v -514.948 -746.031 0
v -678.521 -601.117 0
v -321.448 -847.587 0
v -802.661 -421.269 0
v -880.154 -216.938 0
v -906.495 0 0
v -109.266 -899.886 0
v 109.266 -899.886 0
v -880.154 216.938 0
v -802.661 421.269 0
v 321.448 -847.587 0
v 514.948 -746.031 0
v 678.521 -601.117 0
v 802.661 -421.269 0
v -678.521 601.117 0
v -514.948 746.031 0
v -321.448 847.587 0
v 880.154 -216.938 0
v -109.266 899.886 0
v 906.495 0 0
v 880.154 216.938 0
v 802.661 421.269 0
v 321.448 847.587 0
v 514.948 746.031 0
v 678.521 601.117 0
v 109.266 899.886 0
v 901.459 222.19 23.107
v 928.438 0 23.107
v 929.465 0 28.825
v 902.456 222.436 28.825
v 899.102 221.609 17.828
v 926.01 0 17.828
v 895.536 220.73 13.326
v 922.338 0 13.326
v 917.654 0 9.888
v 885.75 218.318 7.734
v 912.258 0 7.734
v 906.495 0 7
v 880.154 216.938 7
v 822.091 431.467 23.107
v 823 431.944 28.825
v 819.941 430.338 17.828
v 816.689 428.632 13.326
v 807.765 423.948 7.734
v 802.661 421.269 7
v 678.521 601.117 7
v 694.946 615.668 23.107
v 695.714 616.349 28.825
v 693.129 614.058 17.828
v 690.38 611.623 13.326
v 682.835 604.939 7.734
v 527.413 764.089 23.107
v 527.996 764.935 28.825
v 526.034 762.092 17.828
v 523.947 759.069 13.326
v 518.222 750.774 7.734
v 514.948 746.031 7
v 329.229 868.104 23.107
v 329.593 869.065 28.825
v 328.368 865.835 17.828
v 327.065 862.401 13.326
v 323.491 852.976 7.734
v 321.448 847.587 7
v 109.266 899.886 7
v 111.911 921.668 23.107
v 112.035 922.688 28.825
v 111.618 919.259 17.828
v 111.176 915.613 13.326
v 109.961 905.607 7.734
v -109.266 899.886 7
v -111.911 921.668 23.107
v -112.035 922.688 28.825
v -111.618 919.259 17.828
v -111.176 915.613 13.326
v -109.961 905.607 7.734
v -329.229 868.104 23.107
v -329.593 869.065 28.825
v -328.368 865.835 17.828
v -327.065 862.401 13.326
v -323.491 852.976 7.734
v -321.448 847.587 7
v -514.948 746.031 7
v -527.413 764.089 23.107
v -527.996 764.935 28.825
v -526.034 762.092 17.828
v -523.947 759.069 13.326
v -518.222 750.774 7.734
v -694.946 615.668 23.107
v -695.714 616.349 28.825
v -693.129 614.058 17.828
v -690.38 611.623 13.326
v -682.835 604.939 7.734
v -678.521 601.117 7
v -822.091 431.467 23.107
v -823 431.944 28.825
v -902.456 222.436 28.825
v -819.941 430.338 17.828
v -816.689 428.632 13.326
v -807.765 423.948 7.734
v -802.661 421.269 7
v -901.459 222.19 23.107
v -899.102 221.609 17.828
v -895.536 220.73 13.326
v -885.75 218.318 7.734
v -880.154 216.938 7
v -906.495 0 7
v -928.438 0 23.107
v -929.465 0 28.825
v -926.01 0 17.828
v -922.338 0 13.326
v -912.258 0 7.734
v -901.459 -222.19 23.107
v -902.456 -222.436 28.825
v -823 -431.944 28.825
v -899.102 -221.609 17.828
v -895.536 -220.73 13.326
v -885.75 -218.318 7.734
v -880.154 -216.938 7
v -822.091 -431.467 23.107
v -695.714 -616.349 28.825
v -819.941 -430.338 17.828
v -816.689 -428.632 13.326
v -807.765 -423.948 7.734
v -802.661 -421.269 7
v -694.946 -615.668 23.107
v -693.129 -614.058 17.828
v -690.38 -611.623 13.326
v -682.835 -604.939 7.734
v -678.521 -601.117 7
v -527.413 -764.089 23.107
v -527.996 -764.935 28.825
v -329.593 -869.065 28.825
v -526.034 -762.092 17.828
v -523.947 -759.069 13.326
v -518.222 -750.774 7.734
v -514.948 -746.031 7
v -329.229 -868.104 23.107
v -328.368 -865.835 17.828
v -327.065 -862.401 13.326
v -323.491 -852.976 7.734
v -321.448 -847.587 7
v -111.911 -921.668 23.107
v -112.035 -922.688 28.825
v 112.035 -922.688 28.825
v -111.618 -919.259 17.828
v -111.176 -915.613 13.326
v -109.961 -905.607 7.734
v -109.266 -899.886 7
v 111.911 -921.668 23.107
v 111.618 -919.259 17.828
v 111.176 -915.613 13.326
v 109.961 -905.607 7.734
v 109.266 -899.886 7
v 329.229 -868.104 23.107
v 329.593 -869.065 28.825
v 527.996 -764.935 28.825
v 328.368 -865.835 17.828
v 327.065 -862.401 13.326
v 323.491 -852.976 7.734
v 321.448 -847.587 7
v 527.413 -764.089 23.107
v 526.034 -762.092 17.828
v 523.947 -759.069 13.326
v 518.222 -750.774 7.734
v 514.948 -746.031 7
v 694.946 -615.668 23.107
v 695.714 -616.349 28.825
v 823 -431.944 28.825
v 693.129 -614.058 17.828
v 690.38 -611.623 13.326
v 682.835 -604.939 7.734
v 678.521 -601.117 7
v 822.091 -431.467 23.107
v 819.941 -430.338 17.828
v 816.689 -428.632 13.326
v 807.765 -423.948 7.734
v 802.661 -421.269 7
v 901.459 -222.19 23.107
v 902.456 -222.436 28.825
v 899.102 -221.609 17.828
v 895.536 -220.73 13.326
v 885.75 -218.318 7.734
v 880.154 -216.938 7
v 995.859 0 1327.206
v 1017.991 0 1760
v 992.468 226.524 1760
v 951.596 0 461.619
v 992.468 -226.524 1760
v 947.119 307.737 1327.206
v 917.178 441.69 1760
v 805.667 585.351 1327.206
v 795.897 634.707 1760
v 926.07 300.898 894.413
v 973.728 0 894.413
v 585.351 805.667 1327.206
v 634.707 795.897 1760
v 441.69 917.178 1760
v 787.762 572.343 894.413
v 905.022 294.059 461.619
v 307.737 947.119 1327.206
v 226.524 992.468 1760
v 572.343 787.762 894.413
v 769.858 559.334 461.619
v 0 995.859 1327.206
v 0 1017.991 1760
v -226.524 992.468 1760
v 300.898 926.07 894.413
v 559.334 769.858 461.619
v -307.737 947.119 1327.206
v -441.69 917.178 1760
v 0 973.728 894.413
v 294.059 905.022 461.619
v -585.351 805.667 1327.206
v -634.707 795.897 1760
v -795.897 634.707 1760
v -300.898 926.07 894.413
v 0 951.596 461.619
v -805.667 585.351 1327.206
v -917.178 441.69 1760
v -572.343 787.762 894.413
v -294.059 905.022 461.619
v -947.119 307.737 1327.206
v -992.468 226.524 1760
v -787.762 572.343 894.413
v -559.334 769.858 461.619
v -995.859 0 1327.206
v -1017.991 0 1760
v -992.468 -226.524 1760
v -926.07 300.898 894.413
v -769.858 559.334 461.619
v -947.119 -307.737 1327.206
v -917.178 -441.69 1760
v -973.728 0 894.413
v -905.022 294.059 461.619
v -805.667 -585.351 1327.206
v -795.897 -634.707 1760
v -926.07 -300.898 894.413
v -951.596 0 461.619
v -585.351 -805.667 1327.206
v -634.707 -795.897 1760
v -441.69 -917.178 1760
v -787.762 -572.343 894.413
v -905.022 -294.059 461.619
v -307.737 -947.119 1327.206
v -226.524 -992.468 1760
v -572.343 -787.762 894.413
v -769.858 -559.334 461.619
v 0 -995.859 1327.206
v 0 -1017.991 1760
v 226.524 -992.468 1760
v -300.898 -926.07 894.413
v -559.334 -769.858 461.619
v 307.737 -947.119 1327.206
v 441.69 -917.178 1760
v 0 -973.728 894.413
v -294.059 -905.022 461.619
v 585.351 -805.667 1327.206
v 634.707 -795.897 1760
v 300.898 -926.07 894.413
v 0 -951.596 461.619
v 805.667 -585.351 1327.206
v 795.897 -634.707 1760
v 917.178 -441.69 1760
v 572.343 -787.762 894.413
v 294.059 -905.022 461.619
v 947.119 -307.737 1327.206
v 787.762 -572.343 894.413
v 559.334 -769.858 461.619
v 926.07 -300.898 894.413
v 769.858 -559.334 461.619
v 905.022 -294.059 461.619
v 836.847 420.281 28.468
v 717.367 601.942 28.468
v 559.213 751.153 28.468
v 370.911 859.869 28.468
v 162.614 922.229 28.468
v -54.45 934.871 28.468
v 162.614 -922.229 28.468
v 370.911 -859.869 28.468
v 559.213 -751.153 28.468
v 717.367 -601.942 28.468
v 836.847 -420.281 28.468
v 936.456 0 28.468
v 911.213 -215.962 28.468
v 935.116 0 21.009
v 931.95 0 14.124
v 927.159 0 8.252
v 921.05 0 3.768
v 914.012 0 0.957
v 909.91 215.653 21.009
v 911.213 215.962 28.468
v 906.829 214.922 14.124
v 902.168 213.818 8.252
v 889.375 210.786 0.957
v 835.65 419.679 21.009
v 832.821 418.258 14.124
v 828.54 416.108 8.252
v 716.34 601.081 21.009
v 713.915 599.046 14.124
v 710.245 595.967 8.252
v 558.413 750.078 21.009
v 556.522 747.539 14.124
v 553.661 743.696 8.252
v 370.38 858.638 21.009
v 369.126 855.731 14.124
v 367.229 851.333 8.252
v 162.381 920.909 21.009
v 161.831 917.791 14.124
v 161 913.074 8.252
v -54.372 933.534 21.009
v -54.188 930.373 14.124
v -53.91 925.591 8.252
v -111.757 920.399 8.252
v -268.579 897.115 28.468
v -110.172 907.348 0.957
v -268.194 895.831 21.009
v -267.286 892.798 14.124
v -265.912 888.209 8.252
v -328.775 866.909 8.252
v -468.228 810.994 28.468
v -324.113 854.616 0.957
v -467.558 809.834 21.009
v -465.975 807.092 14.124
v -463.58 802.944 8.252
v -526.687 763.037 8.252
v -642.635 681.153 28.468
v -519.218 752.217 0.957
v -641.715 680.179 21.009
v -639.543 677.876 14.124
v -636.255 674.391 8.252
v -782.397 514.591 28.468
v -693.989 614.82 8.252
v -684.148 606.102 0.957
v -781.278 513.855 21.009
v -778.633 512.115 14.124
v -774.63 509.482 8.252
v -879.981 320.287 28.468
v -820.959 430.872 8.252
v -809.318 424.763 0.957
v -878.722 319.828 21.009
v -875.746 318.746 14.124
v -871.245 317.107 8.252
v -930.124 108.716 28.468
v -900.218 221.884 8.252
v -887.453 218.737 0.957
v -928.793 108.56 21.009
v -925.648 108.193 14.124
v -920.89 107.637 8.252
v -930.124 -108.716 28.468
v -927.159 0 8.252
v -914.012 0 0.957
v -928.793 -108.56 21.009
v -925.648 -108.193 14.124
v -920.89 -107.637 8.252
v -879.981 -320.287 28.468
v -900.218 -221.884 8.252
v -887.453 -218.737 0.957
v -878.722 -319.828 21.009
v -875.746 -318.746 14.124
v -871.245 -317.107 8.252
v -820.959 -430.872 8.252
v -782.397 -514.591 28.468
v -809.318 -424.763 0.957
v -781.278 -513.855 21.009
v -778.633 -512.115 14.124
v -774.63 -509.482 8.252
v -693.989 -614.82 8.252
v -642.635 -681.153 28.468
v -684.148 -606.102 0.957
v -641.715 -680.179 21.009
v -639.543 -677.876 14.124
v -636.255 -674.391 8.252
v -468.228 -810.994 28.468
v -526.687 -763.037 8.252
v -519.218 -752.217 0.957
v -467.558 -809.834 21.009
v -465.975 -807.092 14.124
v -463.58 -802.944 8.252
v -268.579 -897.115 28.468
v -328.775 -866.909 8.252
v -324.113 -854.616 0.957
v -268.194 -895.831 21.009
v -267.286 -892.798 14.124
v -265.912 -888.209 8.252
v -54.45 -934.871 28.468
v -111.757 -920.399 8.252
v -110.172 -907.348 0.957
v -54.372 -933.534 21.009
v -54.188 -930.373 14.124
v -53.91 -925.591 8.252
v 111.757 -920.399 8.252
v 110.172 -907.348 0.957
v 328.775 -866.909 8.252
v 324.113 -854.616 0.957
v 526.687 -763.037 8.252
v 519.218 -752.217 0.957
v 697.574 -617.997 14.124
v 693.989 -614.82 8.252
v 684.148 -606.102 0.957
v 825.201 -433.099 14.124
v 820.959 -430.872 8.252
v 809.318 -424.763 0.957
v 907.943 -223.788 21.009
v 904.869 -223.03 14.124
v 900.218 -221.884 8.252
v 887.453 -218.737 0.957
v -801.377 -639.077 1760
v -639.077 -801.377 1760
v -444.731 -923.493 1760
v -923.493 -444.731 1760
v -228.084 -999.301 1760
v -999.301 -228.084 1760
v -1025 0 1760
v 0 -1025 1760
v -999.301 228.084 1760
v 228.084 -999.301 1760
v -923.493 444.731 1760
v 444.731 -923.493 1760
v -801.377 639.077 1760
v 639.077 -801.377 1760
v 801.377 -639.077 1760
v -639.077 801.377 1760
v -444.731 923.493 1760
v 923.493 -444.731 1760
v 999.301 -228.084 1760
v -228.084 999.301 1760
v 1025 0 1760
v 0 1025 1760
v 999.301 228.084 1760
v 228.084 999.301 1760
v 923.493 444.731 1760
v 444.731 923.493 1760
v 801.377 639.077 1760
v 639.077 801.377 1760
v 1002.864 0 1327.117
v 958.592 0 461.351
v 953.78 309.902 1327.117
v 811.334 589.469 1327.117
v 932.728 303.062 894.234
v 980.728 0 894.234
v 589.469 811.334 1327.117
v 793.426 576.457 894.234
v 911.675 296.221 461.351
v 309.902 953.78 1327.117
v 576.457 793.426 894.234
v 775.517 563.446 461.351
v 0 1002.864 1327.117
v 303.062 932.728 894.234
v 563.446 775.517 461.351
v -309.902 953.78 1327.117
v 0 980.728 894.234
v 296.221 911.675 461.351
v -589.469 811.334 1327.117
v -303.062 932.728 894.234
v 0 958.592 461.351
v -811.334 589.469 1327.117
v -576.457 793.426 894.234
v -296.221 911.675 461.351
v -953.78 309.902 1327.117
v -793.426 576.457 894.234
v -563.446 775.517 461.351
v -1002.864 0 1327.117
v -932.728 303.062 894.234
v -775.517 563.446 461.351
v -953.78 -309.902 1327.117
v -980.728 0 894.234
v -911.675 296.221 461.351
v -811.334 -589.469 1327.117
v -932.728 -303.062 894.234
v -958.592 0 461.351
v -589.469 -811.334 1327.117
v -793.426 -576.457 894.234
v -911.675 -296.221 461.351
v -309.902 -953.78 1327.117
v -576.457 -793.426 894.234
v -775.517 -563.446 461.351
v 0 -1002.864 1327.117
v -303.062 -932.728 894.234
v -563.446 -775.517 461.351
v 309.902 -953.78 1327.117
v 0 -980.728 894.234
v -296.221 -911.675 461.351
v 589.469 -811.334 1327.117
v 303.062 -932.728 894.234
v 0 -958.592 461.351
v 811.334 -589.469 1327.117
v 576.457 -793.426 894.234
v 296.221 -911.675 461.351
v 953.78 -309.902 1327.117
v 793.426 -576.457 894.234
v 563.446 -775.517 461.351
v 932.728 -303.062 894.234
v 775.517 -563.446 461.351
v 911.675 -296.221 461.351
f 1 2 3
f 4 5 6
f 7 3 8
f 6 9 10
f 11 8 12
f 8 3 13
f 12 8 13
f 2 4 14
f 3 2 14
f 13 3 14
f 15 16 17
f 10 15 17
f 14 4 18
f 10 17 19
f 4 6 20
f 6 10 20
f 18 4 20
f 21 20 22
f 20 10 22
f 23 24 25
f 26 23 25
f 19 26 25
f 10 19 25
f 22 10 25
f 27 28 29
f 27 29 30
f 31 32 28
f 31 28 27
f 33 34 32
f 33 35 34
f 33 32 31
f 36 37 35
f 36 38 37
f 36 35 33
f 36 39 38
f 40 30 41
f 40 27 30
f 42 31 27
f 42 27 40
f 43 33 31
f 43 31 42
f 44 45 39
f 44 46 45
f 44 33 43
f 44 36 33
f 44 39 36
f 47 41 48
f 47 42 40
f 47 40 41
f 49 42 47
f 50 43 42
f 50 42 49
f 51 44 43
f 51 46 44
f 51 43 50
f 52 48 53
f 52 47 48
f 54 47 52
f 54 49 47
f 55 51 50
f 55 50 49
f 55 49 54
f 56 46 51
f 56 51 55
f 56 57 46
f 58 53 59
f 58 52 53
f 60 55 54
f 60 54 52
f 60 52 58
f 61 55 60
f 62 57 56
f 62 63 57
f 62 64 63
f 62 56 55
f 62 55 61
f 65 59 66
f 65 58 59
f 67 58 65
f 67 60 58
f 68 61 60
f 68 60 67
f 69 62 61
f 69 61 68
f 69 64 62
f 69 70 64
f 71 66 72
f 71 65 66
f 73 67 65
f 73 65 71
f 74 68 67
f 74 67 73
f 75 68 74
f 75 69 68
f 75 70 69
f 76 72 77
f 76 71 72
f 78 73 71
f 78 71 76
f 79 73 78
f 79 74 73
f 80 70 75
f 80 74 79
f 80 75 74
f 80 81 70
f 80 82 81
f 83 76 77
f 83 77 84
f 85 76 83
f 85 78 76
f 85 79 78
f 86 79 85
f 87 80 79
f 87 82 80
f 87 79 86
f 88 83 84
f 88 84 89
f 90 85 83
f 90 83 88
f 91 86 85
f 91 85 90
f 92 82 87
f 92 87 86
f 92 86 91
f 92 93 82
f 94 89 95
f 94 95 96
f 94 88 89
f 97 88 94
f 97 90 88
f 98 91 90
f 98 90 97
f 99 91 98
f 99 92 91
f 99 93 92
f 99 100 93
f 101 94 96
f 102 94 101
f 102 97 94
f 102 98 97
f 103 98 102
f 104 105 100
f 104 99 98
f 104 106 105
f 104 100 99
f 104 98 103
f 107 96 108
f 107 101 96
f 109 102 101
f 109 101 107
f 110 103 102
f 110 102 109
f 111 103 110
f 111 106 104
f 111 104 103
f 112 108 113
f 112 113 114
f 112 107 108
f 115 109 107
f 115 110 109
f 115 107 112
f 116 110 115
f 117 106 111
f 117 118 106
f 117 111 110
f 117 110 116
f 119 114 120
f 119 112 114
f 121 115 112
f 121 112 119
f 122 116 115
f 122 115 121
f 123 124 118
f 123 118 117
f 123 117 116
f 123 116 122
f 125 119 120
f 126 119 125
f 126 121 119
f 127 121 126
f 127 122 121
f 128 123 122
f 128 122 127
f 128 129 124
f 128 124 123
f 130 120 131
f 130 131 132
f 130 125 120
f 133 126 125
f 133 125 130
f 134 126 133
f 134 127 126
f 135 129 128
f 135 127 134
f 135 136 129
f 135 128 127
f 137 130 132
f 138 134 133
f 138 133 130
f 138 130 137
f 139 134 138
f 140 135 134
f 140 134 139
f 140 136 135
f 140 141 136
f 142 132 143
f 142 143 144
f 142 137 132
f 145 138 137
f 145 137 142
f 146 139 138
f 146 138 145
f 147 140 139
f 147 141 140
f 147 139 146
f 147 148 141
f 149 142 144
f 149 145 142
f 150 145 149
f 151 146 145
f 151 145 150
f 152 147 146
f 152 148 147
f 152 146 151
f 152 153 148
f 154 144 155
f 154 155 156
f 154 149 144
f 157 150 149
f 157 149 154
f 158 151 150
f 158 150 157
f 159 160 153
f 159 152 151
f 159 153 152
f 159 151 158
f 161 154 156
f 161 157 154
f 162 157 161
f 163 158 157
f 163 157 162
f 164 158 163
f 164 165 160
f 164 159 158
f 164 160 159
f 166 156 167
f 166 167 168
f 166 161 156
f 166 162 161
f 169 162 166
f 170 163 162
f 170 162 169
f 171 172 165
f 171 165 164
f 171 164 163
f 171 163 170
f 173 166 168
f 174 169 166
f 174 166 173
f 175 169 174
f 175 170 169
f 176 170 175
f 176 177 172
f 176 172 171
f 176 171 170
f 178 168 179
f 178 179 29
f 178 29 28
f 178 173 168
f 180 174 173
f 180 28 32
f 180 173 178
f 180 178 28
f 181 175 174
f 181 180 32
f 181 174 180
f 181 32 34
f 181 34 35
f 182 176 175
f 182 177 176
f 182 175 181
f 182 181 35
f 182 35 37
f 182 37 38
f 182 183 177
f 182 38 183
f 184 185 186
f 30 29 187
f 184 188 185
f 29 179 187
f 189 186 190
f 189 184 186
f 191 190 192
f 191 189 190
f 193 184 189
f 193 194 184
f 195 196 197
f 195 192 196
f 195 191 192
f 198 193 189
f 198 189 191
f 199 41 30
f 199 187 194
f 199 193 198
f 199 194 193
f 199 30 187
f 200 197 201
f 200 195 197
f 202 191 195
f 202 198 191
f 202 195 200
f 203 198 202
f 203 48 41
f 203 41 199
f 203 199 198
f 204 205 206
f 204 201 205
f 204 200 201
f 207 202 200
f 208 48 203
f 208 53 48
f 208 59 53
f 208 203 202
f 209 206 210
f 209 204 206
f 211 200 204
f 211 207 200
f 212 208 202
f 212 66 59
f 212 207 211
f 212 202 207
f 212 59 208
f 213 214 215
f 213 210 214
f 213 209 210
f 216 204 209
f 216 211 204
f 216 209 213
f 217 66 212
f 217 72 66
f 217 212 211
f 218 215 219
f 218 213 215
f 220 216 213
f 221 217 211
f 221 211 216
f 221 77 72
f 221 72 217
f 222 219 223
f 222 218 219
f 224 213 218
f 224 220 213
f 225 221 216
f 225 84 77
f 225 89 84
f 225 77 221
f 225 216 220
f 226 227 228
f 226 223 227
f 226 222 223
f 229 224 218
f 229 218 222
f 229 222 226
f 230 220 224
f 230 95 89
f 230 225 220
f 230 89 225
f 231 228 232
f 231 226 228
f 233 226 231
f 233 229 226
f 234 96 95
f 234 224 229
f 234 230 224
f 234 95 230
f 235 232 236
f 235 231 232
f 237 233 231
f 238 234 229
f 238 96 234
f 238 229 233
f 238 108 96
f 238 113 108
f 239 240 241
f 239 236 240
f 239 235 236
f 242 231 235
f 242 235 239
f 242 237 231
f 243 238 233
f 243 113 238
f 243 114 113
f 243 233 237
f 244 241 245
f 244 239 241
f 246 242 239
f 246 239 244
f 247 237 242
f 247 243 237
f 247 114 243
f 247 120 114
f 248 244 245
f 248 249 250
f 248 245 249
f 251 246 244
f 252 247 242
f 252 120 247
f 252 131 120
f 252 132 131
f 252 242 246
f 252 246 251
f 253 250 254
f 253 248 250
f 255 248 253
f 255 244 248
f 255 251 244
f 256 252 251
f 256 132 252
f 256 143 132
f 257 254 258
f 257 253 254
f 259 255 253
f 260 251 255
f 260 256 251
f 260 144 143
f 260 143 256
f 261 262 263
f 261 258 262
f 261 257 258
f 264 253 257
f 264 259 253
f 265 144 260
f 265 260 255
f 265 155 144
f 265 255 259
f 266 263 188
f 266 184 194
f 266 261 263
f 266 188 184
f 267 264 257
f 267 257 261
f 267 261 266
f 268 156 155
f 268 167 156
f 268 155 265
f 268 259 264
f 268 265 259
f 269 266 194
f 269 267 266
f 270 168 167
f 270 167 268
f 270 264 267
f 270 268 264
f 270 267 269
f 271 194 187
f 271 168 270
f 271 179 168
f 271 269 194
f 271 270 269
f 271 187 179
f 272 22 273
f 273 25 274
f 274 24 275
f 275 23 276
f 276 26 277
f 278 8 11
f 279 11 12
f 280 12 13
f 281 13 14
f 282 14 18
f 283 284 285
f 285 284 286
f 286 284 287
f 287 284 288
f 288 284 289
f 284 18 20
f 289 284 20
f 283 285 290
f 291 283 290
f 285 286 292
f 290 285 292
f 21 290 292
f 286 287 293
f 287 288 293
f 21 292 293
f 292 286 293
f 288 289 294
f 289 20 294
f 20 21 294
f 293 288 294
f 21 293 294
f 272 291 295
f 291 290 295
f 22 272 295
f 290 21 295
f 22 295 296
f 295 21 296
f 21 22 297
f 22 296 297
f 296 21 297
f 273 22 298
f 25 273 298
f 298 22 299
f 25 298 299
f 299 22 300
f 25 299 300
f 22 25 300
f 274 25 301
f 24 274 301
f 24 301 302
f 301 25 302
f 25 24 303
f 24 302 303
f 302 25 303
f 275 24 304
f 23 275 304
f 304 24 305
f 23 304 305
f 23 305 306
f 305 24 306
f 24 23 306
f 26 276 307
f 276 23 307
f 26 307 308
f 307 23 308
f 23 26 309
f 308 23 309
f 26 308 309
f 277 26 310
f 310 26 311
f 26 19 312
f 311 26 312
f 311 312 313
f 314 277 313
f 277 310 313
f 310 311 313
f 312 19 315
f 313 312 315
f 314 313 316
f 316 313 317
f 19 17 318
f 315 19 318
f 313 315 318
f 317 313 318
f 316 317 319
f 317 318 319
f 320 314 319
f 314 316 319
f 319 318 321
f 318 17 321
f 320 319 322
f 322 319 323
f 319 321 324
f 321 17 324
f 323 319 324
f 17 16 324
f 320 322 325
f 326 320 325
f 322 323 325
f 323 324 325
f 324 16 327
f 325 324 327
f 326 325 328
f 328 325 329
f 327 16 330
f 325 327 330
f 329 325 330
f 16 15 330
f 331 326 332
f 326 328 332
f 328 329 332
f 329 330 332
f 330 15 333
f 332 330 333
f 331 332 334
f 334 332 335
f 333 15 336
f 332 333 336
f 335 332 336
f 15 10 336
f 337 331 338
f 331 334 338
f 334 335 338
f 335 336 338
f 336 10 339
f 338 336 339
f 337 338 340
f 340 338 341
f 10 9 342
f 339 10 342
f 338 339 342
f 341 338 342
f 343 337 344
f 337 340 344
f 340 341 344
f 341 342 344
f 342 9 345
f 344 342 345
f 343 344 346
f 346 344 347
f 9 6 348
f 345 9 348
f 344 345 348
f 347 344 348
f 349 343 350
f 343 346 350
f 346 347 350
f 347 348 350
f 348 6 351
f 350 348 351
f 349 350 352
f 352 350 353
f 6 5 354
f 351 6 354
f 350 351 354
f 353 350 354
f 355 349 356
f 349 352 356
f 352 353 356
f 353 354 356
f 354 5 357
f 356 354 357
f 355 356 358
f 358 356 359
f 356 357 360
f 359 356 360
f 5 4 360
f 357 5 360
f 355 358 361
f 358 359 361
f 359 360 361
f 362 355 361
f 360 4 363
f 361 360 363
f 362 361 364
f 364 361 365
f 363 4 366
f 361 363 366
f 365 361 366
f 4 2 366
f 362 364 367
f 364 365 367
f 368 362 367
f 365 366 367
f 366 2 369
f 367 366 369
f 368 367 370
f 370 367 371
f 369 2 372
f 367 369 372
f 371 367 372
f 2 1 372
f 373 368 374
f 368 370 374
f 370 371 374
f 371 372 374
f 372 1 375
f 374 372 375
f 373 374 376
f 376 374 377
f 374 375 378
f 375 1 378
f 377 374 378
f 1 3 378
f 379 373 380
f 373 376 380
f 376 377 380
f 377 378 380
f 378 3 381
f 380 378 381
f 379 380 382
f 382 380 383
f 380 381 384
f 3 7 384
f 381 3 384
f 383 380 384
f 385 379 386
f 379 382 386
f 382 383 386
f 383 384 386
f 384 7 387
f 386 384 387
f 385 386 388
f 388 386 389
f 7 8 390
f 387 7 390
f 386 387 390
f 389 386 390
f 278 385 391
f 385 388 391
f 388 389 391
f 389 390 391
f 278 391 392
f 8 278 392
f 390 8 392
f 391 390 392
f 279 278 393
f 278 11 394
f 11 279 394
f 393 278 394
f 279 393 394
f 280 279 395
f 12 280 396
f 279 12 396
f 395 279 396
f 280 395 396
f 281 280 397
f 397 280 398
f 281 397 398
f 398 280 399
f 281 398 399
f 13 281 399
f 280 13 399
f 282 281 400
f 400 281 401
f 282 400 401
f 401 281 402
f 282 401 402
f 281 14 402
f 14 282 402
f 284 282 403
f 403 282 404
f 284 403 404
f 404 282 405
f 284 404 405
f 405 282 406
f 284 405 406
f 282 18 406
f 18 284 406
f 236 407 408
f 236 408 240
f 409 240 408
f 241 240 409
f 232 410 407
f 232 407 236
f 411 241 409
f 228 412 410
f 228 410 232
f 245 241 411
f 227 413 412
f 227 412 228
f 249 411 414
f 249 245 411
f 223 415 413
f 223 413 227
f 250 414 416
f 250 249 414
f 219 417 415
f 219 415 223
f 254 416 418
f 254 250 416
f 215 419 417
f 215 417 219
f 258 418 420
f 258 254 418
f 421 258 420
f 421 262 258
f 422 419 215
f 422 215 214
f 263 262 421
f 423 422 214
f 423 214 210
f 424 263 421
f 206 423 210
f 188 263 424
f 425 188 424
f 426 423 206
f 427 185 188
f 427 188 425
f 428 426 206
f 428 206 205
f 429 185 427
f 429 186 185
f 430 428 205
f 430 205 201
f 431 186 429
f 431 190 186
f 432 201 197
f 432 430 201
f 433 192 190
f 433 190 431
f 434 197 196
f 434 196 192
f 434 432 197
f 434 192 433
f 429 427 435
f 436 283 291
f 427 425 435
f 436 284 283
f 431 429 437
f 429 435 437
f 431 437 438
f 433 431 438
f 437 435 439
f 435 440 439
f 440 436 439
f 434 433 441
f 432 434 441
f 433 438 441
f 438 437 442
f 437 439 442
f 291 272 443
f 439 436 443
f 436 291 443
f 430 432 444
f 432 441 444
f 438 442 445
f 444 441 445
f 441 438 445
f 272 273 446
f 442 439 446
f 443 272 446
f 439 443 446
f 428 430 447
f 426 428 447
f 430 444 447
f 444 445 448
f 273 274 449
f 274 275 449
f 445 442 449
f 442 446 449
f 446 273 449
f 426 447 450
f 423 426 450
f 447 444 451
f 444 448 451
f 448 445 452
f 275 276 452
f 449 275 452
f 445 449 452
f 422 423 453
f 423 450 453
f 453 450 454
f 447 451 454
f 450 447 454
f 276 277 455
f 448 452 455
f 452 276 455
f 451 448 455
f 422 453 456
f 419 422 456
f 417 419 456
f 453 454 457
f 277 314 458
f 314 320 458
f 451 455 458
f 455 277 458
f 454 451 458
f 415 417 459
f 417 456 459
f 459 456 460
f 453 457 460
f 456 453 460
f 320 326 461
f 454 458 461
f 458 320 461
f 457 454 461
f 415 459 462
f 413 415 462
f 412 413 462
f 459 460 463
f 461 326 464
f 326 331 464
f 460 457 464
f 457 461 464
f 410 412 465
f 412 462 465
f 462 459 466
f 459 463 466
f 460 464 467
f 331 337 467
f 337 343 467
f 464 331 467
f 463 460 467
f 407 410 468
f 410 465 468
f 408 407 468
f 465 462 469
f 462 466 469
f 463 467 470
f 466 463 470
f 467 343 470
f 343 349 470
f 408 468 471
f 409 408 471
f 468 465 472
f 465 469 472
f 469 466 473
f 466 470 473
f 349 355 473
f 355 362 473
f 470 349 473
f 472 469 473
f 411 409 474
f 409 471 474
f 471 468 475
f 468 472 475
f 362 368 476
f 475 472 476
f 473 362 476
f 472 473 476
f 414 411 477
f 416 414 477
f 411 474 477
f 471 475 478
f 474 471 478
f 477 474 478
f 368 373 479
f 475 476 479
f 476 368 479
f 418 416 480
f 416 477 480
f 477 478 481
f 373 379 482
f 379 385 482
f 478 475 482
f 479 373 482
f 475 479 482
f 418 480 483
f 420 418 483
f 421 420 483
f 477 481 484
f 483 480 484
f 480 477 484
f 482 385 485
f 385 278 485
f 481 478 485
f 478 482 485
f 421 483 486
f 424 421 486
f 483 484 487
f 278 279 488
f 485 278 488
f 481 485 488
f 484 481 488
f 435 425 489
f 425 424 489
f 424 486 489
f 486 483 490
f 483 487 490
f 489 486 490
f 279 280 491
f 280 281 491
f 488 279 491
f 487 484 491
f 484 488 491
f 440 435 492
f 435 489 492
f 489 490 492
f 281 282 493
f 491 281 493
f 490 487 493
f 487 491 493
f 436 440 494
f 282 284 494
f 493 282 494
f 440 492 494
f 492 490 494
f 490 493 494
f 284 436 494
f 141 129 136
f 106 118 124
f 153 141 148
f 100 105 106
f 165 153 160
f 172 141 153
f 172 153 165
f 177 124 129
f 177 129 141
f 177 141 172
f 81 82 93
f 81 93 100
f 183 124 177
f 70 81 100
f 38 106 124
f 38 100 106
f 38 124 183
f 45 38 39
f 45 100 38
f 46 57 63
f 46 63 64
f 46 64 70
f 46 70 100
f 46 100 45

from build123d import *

# Parameters (mm, degrees)
F2_R = 1025
F0_R = 935
F4_R = 30
F5_T = -7


with BuildPart() as f3:
    # F2 (on offset) → F3 section 0
    with BuildSketch(Plane.XY.offset(1760)):
        Circle(F2_R)
    # F0 (on Top) → F3 section 1
    with BuildSketch(Plane.XY):
        Circle(F0_R)
    loft()

    # F4
    f4_edges = [f3.edges().sort_by_distance(p)[0] for p in [
        (-935, 0, 0),
    ]]
    fillet(f4_edges, radius=F4_R)

    # F5
    f5_openings = [f3.faces().sort_by_distance(p)[0] for p in [
        (0, 0, 1760),
    ]]
    offset(amount=F5_T, openings=f5_openings, kind=Kind.INTERSECTION)


solid = f3.part
